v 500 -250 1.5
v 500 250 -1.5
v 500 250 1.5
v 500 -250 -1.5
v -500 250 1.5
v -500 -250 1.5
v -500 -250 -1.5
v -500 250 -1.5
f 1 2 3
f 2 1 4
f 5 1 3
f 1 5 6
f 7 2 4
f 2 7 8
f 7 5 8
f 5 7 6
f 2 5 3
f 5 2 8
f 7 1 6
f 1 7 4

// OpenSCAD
// Parameters
sheet_L = 1000; //[500:2000:1]
sheet_W = 500; //[250:1000:1]
sheet_T = 3; //[1.5:6:0.1]
film_T = 0.05; //[0.02:0.2:0.01]
overlap = 1; //[0.5:2:0.1]
corner_radius = 0; //[0:10:0.5]
edge_chamfer = 0; //[0:2:0.1]

// Base Shapes
module sheet_panel() {
  color("Silver")
  translate([0, 0, 0])
    cube([sheet_L, sheet_W, sheet_T], center=true);
}

module protective_film_layer() {
  color([0.85, 0.85, 0.8]) // Off-white for protective film
  translate([0, 0, sheet_T/2 + film_T/2 - overlap])
    cube([sheet_L, sheet_W, film_T], center=true);
}

module label_text() {
  color("Black")
  translate([0, 0, sheet_T/2 + film_T/2 - overlap])
    cube([sheet_L/10, sheet_W/10, film_T], center=true);
}

// Operations
module panel_with_film() {
  union() {
    sheet_panel();
    protective_film_layer();
  }
}

module complete_model() {
  union() {
    panel_with_film();
    label_text();
    // Note: corner_radius and edge_chamfer are not applied as they are set to 0
  }
}

// Final Output
complete_model();
